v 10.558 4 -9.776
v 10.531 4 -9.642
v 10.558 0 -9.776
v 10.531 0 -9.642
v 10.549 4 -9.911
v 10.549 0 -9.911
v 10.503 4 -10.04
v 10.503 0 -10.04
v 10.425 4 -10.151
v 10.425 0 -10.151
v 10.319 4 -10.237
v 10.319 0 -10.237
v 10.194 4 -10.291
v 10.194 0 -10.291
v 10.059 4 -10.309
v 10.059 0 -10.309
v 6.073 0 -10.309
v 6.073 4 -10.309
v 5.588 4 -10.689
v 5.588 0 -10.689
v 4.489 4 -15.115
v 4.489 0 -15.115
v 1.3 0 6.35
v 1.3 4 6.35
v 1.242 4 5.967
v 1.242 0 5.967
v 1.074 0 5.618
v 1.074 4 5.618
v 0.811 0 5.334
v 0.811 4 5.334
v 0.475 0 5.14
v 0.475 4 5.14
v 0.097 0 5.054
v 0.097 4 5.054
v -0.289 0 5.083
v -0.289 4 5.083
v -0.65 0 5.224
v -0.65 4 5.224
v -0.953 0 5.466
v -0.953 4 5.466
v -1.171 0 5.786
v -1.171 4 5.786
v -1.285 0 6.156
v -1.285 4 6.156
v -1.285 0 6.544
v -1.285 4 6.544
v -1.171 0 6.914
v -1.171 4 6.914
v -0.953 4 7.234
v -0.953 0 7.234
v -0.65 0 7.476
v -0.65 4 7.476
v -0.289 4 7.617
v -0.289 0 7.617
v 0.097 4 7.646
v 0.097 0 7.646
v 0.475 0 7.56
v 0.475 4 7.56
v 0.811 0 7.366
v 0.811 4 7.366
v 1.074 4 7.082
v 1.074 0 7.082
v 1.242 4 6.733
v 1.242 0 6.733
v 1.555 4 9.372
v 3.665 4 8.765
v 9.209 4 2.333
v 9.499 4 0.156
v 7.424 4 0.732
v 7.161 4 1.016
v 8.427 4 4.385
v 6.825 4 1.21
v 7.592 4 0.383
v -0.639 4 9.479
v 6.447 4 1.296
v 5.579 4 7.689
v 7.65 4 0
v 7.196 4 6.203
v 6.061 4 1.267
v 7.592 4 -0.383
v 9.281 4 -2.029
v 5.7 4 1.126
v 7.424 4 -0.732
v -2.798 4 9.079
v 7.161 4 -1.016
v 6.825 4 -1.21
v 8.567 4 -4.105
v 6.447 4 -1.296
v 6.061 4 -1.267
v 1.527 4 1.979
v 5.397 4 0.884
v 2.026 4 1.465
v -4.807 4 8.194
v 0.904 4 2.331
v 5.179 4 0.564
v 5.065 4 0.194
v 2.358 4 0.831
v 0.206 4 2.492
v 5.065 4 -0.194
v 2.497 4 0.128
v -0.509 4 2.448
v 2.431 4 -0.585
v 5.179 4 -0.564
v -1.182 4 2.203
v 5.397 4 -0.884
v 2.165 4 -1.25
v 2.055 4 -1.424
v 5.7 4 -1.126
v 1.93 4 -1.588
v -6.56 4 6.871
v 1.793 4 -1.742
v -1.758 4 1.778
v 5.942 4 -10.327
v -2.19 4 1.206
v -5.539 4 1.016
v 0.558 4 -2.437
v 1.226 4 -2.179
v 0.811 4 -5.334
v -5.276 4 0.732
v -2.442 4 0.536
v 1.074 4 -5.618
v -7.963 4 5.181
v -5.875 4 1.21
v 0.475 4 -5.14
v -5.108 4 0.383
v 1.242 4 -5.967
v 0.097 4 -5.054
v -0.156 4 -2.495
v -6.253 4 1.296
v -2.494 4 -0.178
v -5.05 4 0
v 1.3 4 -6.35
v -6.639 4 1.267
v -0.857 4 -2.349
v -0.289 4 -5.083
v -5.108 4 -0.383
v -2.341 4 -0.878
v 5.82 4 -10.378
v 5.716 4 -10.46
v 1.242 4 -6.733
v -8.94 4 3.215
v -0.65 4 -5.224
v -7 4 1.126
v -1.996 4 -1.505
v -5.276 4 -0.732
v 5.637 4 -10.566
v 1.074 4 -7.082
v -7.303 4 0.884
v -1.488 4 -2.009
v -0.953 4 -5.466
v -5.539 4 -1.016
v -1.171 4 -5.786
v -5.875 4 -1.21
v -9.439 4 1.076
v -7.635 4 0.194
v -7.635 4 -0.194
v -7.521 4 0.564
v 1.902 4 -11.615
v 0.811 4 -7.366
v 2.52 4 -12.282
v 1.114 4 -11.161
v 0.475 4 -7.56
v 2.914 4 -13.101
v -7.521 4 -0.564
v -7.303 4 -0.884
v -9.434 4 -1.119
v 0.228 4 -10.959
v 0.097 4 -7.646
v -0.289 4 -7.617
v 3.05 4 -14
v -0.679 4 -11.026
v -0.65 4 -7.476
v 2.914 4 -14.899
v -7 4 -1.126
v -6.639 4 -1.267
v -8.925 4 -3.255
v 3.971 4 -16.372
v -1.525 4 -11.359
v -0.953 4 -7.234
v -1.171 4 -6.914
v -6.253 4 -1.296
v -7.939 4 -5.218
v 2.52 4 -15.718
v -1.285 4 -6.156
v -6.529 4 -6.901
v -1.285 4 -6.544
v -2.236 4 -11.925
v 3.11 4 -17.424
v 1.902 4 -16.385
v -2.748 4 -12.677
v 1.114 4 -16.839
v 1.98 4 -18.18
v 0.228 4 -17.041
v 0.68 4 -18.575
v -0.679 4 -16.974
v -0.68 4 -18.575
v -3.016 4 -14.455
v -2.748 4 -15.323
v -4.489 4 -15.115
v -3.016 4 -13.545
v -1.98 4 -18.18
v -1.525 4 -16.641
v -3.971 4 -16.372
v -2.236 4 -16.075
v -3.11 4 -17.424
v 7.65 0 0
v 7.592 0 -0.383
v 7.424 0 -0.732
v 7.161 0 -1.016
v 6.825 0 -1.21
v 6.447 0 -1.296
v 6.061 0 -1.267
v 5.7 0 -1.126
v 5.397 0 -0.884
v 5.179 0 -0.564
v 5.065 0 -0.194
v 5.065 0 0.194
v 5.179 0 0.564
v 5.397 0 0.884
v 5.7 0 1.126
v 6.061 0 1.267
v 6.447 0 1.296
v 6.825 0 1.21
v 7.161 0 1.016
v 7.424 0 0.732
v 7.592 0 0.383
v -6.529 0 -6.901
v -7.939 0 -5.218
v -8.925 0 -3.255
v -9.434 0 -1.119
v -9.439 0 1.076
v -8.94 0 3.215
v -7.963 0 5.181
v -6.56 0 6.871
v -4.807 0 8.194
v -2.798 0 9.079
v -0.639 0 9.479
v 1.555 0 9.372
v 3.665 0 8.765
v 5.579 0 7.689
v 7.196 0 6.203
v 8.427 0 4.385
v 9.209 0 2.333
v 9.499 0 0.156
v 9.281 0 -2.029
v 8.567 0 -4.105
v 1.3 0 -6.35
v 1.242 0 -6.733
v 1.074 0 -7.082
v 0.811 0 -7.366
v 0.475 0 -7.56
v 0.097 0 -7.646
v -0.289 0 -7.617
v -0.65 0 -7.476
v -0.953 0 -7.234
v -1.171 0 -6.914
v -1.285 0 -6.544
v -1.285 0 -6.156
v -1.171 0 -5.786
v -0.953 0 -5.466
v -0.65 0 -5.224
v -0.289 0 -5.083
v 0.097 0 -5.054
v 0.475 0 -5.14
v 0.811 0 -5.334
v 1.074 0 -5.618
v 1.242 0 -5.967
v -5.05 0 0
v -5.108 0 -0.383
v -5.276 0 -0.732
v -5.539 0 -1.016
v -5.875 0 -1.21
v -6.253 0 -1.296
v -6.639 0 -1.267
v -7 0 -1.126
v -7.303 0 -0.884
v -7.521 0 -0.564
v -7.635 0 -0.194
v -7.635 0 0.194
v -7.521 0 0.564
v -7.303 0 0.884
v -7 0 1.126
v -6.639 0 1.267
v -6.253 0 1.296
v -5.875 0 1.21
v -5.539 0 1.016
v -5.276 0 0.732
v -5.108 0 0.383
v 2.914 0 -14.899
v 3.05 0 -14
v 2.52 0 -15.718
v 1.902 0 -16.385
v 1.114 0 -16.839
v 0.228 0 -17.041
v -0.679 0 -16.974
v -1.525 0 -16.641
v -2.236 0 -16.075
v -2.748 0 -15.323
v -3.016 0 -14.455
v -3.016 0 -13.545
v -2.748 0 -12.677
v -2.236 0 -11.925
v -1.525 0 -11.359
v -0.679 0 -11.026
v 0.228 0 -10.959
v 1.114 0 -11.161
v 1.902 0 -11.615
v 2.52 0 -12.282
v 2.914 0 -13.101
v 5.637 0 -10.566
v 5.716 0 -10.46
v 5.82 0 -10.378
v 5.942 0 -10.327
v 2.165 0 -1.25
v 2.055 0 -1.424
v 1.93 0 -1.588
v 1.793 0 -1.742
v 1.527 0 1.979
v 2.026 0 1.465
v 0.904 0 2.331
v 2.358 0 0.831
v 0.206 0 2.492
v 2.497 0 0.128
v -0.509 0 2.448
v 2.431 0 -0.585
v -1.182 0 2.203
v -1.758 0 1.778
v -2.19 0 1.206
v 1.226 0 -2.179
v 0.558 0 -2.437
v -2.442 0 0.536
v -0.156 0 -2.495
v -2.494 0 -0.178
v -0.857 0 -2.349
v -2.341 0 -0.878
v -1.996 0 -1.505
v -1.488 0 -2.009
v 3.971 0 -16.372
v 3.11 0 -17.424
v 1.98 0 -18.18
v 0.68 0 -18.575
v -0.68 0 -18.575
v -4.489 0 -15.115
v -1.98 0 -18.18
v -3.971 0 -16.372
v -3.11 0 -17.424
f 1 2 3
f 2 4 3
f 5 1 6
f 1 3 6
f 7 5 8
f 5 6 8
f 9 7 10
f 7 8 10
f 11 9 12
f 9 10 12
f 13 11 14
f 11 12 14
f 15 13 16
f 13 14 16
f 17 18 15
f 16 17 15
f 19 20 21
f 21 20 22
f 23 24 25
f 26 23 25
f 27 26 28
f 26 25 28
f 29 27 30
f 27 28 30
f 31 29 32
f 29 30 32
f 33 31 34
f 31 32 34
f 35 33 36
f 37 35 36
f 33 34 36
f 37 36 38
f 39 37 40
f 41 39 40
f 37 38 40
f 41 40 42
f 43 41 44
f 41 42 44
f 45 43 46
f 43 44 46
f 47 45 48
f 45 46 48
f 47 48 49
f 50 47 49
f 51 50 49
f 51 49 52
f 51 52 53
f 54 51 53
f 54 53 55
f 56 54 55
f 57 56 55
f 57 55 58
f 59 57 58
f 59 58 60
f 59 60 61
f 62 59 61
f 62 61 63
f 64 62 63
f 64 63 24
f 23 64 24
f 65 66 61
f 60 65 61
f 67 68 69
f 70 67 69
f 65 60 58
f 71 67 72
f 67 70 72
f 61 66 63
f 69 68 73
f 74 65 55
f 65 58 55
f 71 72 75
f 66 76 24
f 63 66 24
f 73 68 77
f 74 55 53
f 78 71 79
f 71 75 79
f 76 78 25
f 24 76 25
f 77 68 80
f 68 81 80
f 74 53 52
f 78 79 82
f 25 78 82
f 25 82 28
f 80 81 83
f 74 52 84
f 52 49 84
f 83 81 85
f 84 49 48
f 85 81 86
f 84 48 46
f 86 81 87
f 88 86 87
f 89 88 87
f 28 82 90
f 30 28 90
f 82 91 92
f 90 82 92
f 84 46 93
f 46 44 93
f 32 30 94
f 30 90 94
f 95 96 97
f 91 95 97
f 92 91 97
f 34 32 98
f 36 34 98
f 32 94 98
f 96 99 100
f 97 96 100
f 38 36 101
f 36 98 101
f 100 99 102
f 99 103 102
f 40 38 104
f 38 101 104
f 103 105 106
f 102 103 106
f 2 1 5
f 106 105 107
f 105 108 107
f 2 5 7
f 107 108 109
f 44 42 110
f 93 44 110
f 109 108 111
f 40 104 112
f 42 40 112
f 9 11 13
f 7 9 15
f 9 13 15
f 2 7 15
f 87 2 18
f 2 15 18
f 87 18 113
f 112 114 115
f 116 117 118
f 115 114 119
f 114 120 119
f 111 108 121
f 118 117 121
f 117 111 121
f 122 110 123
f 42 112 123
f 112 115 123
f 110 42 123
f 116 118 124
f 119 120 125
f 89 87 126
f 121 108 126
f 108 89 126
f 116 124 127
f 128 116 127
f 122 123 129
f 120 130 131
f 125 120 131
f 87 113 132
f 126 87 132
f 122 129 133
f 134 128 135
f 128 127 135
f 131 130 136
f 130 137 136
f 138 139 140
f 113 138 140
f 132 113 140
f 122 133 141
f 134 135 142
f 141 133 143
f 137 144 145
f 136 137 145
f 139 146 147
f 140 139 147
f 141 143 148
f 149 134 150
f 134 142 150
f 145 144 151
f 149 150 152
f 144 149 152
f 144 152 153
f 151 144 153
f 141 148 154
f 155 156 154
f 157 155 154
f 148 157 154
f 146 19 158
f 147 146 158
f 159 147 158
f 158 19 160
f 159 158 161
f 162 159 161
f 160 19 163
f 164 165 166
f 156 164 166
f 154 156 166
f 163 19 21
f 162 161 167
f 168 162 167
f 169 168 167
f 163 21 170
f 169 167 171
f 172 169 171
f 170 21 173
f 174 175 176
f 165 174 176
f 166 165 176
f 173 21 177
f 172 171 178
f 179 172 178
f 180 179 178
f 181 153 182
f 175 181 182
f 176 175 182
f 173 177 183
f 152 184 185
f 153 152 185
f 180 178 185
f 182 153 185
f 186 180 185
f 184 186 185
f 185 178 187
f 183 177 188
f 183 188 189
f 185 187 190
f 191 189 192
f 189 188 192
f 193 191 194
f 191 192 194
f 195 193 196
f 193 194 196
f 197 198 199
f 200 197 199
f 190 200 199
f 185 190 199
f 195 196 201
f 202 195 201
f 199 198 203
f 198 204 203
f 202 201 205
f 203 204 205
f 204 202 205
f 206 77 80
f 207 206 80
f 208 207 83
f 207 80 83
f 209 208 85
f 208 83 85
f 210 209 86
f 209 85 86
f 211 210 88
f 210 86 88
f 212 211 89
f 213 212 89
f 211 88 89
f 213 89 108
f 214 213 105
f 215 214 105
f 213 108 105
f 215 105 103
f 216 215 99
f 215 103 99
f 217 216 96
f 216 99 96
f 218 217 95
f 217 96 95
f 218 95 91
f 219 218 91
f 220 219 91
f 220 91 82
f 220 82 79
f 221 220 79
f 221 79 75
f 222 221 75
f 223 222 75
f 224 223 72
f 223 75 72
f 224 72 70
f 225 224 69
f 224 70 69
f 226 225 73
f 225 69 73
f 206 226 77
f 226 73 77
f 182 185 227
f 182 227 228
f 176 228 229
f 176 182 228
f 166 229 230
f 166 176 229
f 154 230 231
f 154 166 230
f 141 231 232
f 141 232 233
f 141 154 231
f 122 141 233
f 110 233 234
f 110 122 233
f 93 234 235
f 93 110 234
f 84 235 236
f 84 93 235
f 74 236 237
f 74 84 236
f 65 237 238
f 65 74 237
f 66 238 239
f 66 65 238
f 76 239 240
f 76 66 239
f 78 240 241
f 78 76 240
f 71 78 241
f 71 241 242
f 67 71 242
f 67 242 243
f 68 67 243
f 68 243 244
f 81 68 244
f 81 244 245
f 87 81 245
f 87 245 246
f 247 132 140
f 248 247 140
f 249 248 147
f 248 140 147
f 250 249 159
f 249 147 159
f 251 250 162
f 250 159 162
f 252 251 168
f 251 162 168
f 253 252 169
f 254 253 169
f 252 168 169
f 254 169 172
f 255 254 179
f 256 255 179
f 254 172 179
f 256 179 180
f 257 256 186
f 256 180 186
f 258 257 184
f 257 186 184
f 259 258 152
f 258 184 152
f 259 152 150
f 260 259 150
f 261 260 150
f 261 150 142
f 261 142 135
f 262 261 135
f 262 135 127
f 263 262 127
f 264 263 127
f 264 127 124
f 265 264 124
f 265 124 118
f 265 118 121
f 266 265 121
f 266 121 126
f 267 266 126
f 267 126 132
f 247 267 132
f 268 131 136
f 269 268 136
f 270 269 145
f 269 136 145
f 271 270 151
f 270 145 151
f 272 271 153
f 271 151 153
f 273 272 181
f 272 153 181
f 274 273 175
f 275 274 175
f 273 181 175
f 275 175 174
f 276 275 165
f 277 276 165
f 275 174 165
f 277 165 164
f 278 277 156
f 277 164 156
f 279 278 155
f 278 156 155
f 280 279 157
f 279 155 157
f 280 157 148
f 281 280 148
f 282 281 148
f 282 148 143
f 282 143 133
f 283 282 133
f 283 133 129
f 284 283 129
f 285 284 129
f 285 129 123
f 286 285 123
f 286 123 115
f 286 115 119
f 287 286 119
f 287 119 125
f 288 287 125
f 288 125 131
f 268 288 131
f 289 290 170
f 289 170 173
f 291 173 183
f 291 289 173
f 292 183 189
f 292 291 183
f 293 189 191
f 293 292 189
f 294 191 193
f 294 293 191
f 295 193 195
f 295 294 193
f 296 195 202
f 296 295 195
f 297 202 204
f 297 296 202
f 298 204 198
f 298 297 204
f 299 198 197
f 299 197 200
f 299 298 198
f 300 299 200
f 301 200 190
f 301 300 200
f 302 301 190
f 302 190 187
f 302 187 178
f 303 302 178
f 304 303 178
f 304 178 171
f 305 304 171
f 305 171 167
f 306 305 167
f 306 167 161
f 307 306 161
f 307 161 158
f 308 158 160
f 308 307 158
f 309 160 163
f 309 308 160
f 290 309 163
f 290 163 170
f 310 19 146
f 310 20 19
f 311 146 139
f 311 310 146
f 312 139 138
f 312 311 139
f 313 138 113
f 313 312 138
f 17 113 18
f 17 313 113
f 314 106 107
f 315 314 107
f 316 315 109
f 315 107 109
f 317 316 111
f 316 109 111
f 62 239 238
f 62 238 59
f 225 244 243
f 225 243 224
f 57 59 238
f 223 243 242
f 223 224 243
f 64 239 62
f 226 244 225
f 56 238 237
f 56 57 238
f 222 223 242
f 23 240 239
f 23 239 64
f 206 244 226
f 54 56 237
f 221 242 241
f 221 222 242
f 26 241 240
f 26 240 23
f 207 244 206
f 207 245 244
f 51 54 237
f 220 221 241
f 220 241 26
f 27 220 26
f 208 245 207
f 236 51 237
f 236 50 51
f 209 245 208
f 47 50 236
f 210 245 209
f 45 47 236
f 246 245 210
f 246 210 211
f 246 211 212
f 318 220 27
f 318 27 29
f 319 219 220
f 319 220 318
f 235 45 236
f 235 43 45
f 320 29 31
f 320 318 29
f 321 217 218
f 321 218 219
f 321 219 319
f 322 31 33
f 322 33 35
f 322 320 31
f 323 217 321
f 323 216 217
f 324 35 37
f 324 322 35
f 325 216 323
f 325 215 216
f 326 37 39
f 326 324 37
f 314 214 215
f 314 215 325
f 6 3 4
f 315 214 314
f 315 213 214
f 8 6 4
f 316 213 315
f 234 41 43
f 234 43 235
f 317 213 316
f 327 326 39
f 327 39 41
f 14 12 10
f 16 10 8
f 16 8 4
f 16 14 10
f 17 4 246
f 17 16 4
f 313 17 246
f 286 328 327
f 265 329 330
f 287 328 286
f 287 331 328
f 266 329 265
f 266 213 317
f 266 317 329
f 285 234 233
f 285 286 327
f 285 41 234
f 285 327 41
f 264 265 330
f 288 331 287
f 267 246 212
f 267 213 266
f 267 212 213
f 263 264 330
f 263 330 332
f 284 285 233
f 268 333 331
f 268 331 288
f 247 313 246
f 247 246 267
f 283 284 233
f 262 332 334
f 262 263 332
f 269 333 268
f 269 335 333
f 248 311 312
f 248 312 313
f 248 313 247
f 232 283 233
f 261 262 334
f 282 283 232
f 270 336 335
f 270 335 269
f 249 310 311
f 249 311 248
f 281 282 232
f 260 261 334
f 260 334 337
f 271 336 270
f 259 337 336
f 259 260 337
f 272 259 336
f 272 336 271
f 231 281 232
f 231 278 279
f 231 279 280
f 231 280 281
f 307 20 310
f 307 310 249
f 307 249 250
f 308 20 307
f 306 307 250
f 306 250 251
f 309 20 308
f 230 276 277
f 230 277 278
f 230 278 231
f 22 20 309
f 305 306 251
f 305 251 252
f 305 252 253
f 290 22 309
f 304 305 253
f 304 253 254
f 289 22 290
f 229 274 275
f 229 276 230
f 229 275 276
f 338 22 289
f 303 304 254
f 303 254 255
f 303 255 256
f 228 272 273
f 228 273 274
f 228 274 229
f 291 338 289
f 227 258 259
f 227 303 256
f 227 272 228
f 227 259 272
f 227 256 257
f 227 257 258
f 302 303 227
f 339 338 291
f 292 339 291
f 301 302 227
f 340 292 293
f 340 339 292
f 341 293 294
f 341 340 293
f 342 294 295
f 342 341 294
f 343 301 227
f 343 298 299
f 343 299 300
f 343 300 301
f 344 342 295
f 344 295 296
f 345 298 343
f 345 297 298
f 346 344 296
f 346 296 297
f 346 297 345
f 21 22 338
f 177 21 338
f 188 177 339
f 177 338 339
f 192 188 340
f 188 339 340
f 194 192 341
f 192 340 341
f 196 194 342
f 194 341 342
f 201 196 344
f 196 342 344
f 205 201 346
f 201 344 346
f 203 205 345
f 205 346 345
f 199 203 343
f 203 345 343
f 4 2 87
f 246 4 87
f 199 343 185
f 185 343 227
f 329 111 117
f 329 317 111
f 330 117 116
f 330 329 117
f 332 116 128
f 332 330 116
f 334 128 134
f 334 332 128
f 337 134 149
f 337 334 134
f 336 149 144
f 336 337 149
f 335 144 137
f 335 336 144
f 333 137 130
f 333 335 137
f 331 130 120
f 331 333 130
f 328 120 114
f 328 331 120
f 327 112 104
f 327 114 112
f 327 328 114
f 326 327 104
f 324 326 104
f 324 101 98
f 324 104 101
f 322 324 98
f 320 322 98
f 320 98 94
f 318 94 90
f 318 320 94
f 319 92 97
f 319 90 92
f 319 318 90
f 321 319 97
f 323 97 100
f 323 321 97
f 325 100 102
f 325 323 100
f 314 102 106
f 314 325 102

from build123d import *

# Parameters (mm, degrees)
SKETCH1_R           = 3.05
SKETCH1_R_2         = 2.5
BOSS_EXTRUDE1_DEPTH = 4
SKETCH2_R           = 1.3
CUT_EXTRUDE1_DEPTH  = 4
SKETCH3_R           = 7.65
BOSS_EXTRUDE2_DEPTH = 4
BOSS_EXTRUDE3_DEPTH = 4
FILLET9_R           = 0.5


with BuildPart() as part:
    # Sketch1 → Boss-Extrude1 (new body)
    with BuildSketch(Plane(origin=(0, 0, 0), x_dir=(1, 0, 0), z_dir=(0, 1, 0))):
        with BuildLine():
            Line((-4.488689239, 15.114947499), (-7.764071496, 1.928521143))
            ThreePointArc((-7.764071496, 1.928521143), (0, -8), (7.764071496, 1.928521143))
            Line((7.764071496, 1.928521143), (4.488689239, 15.114947499))
            ThreePointArc((4.488689239, 15.114947499), (0, 18.625088), (-4.488689239, 15.114947499))
        make_face()
        with Locations((0, 14)):
            Circle(SKETCH1_R, mode=Mode.SUBTRACT)
        Circle(SKETCH1_R_2, mode=Mode.SUBTRACT)
    extrude(amount=BOSS_EXTRUDE1_DEPTH)

    # Sketch2 → Cut-Extrude1 (cut)
    with BuildSketch(Plane(origin=(0, 4, 0), x_dir=(1, 0, 0), z_dir=(0, 1, 0))):
        with Locations((0, 6.35)):
            Circle(SKETCH2_R)
        with Locations((6.35, 0)):
            Circle(SKETCH2_R)
        with Locations((0, -6.35)):
            Circle(SKETCH2_R)
        with Locations((-6.35, 0)):
            Circle(SKETCH2_R)
    extrude(amount=-CUT_EXTRUDE1_DEPTH, mode=Mode.SUBTRACT)

    # Sketch3 → Boss-Extrude2 (add)
    with BuildSketch(Plane(origin=(0, 4, 0), x_dir=(1, 0, 0), z_dir=(0, 1, 0))):
        with BuildLine():
            ThreePointArc((-1.549317863, 9.3728125), (0, -9.5), (1.549317863, 9.3728125))
            ThreePointArc((1.549317863, 9.3728125), (0, 9.120322757), (-1.549317863, 9.3728125))
        make_face()
        Circle(SKETCH3_R, mode=Mode.SUBTRACT)
    extrude(amount=-BOSS_EXTRUDE2_DEPTH)

    # Sketch4 → Boss-Extrude3 (add)
    with BuildSketch(Plane(origin=(0, 4, 0), x_dir=(1, 0, 0), z_dir=(0, 1, 0))):
        with BuildLine():
            Line((10.767160229, 10.309478294), (8.567165836, 4.1053221))
            Line((8.567165836, 4.1053221), (2.165063509, 1.25))
            ThreePointArc((2.165063509, 1.25), (1.994303817, 1.507565019), (1.793071605, 1.742094779))
            Line((1.793071605, 1.742094779), (5.682321854, 10.309478294))
            Line((5.682321854, 10.309478294), (10.767160229, 10.309478294))
        make_face()
    extrude(amount=-BOSS_EXTRUDE3_DEPTH)

    # Fillet9
    fillet9_edges = [part.edges().sort_by_distance(p)[0] for p in [
        (5.682321854, 2, -10.309478294),
        (10.767160229, 2, -10.309478294),
    ]]
    fillet(fillet9_edges, radius=FILLET9_R)


solid = part.part
